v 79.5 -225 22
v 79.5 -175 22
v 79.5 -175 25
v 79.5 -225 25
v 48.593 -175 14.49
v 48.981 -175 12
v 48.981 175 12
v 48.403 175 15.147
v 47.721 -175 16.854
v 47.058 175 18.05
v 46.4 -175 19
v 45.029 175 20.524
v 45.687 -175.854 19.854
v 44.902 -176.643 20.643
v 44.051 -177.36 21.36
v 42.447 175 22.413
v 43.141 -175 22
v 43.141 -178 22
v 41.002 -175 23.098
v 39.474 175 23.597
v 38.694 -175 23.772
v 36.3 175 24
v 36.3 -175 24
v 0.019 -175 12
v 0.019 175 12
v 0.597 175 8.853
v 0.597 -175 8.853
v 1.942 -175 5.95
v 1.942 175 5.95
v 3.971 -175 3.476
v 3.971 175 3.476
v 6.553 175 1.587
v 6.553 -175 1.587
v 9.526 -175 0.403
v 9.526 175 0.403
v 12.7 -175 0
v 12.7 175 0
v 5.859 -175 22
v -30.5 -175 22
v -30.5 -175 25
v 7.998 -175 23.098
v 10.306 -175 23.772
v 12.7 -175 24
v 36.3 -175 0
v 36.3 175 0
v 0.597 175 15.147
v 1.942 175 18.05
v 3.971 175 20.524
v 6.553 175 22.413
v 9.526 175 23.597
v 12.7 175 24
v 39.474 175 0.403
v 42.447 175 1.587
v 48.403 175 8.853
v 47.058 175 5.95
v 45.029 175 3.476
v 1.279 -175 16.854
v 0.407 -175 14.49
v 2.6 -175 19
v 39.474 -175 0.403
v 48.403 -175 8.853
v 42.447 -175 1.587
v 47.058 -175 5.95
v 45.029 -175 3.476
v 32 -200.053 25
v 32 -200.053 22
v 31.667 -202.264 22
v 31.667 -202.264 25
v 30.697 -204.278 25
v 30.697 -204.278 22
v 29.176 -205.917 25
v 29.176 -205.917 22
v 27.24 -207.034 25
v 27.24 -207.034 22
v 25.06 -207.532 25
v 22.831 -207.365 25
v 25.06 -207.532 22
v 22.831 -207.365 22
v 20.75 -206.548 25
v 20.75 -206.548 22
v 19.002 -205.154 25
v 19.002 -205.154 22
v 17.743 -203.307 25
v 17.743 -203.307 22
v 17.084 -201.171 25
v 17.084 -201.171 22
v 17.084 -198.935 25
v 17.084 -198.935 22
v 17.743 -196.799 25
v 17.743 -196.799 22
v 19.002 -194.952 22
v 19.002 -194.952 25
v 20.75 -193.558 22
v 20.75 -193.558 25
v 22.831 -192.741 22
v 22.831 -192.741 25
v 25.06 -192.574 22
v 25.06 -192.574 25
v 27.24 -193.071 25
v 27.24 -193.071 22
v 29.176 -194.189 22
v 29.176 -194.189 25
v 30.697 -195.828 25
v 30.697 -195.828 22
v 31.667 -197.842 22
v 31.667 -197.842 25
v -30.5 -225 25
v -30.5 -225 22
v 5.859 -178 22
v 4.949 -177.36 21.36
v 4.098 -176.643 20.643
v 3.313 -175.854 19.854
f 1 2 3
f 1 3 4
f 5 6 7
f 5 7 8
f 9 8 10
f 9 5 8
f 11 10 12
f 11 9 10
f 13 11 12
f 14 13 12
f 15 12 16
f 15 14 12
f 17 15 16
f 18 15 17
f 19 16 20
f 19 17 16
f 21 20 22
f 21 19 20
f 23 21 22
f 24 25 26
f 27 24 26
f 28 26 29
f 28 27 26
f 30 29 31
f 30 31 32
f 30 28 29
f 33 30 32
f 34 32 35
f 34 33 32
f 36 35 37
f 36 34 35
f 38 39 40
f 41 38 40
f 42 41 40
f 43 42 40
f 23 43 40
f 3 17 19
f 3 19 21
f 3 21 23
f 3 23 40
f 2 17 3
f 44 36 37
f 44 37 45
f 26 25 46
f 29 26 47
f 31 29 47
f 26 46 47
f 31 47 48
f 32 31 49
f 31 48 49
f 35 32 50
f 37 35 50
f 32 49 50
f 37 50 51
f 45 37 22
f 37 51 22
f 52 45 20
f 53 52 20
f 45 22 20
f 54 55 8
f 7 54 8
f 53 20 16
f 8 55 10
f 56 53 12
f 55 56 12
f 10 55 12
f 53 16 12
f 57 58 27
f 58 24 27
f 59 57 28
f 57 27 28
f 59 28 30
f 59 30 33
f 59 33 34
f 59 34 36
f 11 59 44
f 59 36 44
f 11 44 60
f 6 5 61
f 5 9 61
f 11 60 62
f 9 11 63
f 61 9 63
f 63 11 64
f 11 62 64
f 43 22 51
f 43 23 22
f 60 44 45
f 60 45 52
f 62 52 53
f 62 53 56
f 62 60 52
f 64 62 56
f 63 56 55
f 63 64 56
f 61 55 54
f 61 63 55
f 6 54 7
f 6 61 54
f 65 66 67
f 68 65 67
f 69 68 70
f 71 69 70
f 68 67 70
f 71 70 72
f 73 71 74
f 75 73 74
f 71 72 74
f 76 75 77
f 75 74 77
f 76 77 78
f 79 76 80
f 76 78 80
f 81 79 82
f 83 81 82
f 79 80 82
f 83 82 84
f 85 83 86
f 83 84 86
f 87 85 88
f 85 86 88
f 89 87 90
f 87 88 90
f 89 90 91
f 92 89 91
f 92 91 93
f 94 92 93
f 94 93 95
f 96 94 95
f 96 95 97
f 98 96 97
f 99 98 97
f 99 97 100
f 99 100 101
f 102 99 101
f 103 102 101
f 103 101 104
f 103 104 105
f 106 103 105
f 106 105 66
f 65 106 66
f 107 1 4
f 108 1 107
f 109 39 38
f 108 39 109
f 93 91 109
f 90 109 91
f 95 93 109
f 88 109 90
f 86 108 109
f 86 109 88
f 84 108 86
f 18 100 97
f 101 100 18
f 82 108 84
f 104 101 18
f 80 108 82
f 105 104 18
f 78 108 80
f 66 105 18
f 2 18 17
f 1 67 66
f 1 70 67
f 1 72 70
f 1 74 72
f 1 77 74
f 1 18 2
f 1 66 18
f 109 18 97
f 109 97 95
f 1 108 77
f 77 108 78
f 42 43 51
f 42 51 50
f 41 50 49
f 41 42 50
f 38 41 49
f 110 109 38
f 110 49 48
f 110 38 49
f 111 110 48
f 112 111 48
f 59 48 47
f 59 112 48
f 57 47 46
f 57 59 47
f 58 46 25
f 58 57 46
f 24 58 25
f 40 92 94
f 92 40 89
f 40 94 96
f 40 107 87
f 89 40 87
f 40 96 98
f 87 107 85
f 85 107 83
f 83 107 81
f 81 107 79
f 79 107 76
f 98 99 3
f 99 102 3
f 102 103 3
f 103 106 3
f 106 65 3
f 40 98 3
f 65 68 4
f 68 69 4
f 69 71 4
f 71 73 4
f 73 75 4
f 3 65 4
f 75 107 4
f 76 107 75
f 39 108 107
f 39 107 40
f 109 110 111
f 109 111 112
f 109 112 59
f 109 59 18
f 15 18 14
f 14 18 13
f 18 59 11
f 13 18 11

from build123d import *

# Parameters (mm, degrees)
F1_DEPTH = 175
F3_DEPTH = 25
F4_W     = 110
F4_H     = 50
F5_DEPTH = 22
F6_SIZE  = 3
F7_R     = 7.5
F8_DEPTH = 25


with BuildPart() as f1:
    # F0 (on Front) → F1 (new body, symmetric)
    with BuildSketch(Plane.XZ):
        with BuildLine():
            ThreePointArc((0.0193060127, 12), (3.9707388629, 3.4755758987), (12.7, 0))
            Line((12.7, 0), (36.3, 0))
            ThreePointArc((36.3, 0), (45.0292611371, 3.4755758987), (48.9806939873, 12))
            ThreePointArc((48.9806939873, 12), (45.0292611371, 20.5244241013), (36.3, 24))
            Line((36.3, 24), (12.7, 24))
            ThreePointArc((12.7, 24), (3.9707388629, 20.5244241013), (0.0193060127, 12))
        make_face()
    extrude(amount=F1_DEPTH, both=True)

    # F2 (on face) → F3 (join)
    with BuildSketch(Plane(origin=(0, 0, 0), x_dir=(1, 0, 0), z_dir=(0, 0, -1))):
        Polygon((79.5, 175), (79.5, 200), (79.5, 225), (-30.5, 225), (-30.5, 175), align=None)
    extrude(amount=-F3_DEPTH)

    # F4 (on face) → F5 (cut)
    with BuildSketch(Plane(origin=(0, 0, 0), x_dir=(1, 0, 0), z_dir=(0, 0, -1))):
        with Locations((24.5, 200)):
            Rectangle(F4_W, F4_H)
    extrude(amount=-F5_DEPTH, mode=Mode.SUBTRACT)

    # F6
    f6_edges = [f1.edges().sort_by_distance(p)[0] for p in [
        (24.5, -175, 22),
    ]]
    chamfer(f6_edges, length=F6_SIZE)

    # F7 (on face) → F8 (cut)
    with BuildSketch(Plane(origin=(0, 0, 22), x_dir=(1, 0, 0), z_dir=(0, 0, -1))):
        with Locations((24.5, 200.0529274344)):
            Circle(F7_R)
    extrude(amount=-F8_DEPTH, mode=Mode.SUBTRACT)


solid = f1.part
